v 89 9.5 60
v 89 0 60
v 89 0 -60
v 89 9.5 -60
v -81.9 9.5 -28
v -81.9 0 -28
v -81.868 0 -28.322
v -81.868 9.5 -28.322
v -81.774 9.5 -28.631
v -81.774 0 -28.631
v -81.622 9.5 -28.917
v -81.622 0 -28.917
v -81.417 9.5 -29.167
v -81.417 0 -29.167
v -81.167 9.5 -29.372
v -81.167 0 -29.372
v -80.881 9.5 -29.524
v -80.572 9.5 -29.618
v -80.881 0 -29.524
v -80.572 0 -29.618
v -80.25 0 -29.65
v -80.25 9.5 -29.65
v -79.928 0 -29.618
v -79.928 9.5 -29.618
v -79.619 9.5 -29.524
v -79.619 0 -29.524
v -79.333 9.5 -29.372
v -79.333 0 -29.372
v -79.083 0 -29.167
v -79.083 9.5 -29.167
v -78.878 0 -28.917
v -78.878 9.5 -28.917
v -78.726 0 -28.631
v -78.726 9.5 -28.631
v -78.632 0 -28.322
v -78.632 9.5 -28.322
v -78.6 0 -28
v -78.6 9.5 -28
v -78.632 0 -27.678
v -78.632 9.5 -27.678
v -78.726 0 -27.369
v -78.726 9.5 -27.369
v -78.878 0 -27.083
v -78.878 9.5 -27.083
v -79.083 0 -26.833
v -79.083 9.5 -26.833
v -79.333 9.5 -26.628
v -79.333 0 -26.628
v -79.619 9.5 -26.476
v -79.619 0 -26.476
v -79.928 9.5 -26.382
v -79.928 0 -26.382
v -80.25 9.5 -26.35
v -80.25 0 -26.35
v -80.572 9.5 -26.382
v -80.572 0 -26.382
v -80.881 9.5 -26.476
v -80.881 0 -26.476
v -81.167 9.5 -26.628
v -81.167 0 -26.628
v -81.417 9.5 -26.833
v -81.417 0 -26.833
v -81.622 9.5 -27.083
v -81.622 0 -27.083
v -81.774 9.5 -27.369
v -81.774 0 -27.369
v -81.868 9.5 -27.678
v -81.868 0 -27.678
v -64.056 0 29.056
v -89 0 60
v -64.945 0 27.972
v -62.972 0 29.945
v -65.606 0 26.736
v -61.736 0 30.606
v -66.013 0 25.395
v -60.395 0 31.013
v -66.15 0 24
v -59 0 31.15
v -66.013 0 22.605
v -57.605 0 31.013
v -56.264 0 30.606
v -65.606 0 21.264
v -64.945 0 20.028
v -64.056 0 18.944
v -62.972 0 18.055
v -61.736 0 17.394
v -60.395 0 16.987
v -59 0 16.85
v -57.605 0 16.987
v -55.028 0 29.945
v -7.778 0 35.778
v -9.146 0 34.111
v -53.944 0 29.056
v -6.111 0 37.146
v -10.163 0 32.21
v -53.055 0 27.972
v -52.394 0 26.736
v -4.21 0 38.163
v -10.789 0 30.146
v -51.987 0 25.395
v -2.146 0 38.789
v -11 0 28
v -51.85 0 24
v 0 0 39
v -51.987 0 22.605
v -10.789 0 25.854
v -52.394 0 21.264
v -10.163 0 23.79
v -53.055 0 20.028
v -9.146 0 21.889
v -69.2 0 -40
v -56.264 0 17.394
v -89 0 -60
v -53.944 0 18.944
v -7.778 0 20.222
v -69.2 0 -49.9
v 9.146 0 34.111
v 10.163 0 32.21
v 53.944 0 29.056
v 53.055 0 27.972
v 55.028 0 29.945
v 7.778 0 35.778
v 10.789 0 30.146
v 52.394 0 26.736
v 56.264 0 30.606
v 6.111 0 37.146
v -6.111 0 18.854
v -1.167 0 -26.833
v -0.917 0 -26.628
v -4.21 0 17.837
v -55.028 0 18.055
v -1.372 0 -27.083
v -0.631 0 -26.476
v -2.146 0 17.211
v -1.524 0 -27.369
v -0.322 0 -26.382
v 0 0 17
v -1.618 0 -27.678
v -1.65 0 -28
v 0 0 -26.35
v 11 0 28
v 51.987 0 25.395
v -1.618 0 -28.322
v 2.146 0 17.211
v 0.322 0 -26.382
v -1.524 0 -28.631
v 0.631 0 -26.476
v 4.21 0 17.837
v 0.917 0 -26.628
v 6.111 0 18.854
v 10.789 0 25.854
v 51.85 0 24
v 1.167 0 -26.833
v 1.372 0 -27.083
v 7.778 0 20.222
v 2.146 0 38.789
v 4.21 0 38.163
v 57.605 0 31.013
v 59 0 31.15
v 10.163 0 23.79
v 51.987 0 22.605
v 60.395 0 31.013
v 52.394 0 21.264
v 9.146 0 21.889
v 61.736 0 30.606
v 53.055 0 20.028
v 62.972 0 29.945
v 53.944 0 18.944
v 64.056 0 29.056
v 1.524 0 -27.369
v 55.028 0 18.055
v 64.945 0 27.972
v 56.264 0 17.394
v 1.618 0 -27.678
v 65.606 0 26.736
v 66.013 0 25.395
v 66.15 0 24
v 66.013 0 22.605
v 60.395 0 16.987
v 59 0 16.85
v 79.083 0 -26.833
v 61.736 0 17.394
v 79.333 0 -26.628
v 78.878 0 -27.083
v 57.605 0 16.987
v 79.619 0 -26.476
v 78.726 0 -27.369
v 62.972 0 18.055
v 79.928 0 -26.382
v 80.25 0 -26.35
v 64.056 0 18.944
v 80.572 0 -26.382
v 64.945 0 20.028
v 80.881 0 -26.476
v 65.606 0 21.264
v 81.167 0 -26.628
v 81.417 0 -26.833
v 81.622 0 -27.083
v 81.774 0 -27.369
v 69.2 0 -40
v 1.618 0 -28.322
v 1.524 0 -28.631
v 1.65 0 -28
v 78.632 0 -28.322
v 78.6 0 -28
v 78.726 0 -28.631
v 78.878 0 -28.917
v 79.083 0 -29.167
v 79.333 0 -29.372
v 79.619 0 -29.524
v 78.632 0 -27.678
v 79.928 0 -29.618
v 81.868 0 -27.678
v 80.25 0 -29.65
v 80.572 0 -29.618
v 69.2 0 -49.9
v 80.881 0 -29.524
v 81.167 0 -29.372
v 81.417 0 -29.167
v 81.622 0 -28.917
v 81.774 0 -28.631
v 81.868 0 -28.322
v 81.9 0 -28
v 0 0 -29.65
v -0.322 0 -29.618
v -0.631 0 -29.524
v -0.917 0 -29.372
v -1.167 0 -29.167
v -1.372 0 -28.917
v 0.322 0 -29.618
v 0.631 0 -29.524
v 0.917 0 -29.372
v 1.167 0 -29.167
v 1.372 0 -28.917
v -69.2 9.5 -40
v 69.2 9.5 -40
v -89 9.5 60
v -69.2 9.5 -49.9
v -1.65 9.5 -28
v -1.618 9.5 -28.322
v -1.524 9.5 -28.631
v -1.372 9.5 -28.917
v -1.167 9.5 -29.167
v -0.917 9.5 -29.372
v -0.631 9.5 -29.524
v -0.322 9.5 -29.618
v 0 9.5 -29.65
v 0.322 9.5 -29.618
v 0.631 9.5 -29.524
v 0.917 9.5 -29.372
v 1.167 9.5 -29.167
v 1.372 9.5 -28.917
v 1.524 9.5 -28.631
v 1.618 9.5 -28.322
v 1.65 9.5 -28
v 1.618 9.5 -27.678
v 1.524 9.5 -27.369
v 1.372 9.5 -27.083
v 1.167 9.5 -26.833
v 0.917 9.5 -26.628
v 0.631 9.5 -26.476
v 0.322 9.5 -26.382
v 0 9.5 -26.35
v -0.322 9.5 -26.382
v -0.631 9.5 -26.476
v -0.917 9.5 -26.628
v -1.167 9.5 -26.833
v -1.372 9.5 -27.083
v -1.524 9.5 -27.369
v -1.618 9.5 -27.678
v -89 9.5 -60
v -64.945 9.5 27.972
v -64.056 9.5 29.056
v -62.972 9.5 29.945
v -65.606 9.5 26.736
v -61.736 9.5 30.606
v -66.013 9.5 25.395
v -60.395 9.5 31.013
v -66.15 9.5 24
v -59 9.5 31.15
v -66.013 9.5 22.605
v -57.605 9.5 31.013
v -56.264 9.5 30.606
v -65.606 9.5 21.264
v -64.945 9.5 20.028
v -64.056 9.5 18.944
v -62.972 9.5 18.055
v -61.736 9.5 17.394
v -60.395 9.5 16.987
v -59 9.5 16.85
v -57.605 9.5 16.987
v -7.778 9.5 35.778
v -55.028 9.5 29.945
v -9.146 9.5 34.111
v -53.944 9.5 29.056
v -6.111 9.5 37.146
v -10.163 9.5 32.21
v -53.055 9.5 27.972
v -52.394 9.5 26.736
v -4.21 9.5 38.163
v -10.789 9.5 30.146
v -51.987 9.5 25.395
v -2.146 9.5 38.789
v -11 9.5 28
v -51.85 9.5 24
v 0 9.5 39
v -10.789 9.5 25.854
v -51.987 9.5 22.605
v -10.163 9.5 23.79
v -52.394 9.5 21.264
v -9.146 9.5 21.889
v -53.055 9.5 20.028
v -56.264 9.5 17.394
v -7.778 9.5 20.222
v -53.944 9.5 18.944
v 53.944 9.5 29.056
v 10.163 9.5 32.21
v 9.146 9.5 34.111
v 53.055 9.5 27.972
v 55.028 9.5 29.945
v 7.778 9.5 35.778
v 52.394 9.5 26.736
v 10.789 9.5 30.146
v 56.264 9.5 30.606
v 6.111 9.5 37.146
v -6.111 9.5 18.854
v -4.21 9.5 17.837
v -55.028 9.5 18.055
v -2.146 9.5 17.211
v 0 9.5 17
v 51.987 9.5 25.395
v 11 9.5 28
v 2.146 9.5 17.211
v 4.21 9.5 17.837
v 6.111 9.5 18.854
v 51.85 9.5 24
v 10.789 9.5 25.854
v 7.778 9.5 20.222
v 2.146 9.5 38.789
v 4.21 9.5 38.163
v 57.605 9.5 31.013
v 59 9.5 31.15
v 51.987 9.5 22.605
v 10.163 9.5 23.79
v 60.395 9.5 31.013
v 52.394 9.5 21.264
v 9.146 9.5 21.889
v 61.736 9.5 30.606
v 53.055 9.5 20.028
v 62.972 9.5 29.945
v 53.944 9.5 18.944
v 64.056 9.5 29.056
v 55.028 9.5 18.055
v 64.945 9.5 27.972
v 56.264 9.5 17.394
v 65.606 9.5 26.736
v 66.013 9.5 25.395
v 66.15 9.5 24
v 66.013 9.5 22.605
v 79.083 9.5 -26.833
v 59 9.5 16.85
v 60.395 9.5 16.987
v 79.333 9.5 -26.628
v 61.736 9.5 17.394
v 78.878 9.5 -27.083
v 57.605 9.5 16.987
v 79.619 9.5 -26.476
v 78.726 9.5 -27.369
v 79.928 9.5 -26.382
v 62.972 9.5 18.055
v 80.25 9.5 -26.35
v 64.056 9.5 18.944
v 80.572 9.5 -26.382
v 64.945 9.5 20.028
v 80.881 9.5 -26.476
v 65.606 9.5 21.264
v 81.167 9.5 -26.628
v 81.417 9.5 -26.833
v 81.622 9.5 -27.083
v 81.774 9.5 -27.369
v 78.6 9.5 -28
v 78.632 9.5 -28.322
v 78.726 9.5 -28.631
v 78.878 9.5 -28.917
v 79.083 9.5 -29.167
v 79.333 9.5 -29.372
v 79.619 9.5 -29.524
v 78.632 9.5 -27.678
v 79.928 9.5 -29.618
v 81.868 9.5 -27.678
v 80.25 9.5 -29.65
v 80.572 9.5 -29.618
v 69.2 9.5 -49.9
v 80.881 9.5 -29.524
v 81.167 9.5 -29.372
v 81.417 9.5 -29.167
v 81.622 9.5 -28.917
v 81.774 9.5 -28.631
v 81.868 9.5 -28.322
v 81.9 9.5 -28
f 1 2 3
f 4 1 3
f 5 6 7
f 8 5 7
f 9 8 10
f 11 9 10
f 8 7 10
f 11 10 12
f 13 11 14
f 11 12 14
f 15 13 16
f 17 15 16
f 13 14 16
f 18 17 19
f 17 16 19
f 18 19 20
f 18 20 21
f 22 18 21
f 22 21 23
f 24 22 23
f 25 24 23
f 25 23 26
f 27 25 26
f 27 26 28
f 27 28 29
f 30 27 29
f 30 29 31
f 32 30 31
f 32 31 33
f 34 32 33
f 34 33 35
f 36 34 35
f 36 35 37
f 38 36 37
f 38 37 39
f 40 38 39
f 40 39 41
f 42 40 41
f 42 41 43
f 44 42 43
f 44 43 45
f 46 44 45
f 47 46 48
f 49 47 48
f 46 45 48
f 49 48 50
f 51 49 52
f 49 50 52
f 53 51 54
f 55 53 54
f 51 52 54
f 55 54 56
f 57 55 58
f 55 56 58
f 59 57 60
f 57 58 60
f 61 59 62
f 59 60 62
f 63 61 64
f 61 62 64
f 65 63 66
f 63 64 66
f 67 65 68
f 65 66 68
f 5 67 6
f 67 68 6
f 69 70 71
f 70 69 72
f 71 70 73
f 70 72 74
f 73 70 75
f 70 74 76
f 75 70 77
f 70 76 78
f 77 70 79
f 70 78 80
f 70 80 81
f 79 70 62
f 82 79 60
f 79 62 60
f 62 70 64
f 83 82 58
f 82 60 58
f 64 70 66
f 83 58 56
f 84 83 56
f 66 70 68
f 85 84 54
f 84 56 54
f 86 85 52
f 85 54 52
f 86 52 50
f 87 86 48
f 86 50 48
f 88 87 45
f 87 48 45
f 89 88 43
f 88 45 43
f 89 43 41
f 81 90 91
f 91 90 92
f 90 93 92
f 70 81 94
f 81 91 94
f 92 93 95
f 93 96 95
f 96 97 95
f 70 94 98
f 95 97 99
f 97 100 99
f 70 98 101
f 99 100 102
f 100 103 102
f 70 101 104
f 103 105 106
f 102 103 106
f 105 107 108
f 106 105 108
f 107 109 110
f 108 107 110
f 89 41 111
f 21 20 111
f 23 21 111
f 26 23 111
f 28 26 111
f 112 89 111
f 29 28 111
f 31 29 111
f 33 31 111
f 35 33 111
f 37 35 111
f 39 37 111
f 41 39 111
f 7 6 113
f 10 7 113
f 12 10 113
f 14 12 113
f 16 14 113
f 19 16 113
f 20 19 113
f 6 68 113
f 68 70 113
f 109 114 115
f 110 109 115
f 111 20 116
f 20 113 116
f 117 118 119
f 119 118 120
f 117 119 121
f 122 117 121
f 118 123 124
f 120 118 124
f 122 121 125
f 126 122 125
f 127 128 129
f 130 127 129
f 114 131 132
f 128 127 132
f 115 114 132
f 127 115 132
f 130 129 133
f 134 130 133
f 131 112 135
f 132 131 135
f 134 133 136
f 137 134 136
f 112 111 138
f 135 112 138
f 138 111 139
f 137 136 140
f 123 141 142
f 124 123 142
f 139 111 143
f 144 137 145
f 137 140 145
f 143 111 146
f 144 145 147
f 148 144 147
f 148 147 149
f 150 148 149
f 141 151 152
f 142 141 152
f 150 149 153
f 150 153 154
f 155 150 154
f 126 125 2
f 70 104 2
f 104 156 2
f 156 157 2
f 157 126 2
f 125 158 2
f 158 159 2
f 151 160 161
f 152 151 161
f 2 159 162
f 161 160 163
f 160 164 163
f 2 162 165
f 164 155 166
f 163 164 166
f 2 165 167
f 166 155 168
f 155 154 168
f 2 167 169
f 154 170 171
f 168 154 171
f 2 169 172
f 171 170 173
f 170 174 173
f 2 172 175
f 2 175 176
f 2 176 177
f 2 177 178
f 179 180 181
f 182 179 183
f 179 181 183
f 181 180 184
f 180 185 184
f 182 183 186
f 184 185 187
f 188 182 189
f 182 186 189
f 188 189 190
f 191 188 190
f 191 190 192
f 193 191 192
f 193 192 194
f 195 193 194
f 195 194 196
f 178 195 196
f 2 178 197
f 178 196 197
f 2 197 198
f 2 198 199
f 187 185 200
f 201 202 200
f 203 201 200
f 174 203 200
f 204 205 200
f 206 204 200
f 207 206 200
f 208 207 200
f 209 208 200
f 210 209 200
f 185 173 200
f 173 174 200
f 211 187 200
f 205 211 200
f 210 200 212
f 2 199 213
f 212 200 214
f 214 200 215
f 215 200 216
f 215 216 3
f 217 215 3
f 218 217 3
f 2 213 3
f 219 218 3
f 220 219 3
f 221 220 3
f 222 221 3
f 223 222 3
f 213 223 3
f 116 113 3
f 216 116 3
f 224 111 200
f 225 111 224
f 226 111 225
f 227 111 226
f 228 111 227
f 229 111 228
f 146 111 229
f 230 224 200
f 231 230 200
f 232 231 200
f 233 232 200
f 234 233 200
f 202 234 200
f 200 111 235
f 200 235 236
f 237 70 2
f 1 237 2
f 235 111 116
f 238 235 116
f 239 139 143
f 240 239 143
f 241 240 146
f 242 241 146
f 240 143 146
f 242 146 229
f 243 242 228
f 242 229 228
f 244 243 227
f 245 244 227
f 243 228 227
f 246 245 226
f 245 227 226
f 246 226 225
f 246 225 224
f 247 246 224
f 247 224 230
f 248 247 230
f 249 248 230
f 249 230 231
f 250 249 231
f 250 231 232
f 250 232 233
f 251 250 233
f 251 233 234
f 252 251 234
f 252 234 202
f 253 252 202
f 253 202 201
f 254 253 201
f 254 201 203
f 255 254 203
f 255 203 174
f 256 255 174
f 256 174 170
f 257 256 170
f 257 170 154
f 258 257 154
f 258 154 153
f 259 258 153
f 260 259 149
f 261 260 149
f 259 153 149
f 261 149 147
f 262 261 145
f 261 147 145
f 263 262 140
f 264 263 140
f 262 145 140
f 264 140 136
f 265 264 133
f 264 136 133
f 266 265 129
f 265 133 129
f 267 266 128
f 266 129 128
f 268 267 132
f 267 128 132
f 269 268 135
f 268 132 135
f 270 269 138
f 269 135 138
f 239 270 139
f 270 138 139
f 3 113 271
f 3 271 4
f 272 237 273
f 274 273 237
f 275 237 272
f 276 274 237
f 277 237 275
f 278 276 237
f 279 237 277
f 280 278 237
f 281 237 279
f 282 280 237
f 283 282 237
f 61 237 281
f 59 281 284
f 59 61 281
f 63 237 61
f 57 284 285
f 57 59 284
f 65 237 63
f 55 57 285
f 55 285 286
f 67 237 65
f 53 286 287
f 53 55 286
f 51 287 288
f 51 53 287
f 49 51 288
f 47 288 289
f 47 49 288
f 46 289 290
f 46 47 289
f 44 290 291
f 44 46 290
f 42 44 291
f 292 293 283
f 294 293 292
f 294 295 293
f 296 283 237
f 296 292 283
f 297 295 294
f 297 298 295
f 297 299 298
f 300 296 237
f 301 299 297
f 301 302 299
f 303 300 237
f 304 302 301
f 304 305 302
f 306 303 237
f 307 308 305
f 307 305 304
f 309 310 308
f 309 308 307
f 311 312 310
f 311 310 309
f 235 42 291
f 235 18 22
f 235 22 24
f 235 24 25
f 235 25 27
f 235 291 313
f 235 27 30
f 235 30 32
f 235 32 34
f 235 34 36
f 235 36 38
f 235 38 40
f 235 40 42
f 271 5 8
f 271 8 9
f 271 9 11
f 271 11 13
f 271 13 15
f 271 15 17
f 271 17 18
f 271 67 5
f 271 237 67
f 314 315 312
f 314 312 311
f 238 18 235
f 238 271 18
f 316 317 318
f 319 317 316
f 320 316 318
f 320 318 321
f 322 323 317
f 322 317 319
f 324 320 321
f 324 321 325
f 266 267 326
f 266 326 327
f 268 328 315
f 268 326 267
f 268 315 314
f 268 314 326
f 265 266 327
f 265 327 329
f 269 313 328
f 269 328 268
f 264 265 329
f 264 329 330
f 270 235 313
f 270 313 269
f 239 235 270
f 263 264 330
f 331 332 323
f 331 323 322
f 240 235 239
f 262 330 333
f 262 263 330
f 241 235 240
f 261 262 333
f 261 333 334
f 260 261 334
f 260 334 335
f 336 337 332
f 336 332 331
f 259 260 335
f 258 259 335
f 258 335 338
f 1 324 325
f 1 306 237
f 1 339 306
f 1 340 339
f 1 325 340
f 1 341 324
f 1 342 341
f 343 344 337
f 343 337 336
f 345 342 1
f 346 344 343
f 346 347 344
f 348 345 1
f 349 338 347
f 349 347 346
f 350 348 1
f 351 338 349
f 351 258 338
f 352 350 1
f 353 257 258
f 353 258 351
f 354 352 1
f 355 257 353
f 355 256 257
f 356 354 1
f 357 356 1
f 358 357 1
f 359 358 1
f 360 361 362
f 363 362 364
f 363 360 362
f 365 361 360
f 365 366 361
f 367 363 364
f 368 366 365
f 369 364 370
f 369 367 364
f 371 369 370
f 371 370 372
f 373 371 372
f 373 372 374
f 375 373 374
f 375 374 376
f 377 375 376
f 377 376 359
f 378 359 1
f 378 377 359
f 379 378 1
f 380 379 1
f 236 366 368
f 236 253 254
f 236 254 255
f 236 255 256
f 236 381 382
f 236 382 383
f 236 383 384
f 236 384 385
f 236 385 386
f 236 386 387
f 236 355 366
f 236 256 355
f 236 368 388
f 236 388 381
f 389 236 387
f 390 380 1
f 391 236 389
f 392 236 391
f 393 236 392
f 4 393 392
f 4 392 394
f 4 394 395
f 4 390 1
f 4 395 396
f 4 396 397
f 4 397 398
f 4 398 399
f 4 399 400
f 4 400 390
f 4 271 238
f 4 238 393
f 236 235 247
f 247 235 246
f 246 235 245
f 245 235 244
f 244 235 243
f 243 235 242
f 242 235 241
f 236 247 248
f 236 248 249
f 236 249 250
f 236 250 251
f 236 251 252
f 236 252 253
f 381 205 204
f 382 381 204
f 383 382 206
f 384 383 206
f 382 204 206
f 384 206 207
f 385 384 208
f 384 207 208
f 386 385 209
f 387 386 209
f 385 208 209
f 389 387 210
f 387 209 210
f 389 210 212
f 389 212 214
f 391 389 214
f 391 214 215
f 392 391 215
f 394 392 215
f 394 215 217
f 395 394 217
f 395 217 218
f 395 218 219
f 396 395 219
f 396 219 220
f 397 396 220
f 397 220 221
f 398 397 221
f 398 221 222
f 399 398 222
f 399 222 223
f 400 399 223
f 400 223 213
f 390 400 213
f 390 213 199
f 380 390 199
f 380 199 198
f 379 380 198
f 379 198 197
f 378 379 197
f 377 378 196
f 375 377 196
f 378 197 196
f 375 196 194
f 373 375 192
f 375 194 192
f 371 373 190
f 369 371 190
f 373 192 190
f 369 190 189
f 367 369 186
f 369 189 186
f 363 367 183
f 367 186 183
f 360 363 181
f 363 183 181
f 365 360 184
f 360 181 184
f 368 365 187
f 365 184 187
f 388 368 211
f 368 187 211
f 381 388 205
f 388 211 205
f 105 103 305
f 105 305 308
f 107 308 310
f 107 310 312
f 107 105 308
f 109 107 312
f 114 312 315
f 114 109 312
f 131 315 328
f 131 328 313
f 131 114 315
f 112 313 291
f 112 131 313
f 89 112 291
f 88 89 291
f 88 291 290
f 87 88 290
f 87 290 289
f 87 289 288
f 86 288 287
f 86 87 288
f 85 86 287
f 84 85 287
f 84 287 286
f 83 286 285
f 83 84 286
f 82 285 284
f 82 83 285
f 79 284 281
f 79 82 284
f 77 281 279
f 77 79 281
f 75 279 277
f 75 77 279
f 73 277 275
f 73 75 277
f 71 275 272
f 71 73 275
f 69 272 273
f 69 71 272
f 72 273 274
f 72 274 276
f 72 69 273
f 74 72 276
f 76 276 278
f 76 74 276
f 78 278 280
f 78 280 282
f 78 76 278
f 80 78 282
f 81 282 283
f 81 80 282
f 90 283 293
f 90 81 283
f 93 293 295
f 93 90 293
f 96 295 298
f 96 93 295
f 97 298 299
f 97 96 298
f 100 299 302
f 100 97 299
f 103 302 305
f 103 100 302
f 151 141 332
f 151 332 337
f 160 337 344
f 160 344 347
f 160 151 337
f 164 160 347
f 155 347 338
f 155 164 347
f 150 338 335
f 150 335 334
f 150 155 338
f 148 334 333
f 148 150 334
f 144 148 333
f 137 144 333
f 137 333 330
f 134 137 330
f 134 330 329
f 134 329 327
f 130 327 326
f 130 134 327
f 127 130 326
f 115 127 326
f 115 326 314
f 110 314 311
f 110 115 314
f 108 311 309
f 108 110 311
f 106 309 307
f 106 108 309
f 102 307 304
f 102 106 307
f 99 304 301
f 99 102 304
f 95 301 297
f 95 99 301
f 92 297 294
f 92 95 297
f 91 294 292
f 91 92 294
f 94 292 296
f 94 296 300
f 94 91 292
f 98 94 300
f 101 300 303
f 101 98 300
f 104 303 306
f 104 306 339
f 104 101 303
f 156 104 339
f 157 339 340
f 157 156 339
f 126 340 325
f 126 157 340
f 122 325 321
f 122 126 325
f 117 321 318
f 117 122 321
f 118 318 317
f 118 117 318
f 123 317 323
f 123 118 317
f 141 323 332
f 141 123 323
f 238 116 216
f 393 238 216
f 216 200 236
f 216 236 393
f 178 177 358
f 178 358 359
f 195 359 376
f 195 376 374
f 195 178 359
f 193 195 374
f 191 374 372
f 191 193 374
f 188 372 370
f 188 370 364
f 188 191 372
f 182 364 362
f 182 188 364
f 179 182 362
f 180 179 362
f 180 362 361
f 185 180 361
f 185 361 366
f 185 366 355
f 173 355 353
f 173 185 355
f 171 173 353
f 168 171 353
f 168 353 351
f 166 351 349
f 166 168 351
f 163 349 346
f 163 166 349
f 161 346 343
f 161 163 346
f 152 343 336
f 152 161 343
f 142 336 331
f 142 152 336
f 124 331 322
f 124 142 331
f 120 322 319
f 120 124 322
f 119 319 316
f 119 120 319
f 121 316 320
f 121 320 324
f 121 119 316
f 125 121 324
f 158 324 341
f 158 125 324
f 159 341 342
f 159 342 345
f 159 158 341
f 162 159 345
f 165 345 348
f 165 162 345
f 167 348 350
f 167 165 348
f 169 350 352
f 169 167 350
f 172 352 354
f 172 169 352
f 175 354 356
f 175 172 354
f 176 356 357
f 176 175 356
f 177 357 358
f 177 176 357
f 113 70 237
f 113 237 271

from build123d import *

# Parameters (mm, degrees)
SKETCH1_W           = 178
SKETCH1_H           = 120
SKETCH1_R           = 11
SKETCH1_R_2         = 7.15
SKETCH1_W_2         = 138.4
SKETCH1_H_2         = 9.9
BOSS_EXTRUDE1_DEPTH = 9.5
M4_TAPPED_HOLE1_D   = 3.3


with BuildPart() as part:
    # Sketch1 → Boss-Extrude1 (new body)
    with BuildSketch(Plane(origin=(0, 0, 0), x_dir=(1, 0, 0), z_dir=(0, 1, 0))):
        Rectangle(SKETCH1_W, SKETCH1_H)
        with Locations((0, -28)):
            Circle(SKETCH1_R, mode=Mode.SUBTRACT)
        with Locations((-59, -24)):
            Circle(SKETCH1_R_2, mode=Mode.SUBTRACT)
        with Locations((59, -24)):
            Circle(SKETCH1_R_2, mode=Mode.SUBTRACT)
        with Locations((0, 44.95)):
            Rectangle(SKETCH1_W_2, SKETCH1_H_2, mode=Mode.SUBTRACT)
    extrude(amount=BOSS_EXTRUDE1_DEPTH)

    # M4 Tapped Hole1 (through all)
    with Locations(Plane(origin=(0, 9.5, 0), x_dir=(1, 0, 0), z_dir=(0, 1, 0))):
        with Locations((-80.25, 28), (0, 28), (80.25, 28)):
            Hole(M4_TAPPED_HOLE1_D / 2)


solid = part.part
